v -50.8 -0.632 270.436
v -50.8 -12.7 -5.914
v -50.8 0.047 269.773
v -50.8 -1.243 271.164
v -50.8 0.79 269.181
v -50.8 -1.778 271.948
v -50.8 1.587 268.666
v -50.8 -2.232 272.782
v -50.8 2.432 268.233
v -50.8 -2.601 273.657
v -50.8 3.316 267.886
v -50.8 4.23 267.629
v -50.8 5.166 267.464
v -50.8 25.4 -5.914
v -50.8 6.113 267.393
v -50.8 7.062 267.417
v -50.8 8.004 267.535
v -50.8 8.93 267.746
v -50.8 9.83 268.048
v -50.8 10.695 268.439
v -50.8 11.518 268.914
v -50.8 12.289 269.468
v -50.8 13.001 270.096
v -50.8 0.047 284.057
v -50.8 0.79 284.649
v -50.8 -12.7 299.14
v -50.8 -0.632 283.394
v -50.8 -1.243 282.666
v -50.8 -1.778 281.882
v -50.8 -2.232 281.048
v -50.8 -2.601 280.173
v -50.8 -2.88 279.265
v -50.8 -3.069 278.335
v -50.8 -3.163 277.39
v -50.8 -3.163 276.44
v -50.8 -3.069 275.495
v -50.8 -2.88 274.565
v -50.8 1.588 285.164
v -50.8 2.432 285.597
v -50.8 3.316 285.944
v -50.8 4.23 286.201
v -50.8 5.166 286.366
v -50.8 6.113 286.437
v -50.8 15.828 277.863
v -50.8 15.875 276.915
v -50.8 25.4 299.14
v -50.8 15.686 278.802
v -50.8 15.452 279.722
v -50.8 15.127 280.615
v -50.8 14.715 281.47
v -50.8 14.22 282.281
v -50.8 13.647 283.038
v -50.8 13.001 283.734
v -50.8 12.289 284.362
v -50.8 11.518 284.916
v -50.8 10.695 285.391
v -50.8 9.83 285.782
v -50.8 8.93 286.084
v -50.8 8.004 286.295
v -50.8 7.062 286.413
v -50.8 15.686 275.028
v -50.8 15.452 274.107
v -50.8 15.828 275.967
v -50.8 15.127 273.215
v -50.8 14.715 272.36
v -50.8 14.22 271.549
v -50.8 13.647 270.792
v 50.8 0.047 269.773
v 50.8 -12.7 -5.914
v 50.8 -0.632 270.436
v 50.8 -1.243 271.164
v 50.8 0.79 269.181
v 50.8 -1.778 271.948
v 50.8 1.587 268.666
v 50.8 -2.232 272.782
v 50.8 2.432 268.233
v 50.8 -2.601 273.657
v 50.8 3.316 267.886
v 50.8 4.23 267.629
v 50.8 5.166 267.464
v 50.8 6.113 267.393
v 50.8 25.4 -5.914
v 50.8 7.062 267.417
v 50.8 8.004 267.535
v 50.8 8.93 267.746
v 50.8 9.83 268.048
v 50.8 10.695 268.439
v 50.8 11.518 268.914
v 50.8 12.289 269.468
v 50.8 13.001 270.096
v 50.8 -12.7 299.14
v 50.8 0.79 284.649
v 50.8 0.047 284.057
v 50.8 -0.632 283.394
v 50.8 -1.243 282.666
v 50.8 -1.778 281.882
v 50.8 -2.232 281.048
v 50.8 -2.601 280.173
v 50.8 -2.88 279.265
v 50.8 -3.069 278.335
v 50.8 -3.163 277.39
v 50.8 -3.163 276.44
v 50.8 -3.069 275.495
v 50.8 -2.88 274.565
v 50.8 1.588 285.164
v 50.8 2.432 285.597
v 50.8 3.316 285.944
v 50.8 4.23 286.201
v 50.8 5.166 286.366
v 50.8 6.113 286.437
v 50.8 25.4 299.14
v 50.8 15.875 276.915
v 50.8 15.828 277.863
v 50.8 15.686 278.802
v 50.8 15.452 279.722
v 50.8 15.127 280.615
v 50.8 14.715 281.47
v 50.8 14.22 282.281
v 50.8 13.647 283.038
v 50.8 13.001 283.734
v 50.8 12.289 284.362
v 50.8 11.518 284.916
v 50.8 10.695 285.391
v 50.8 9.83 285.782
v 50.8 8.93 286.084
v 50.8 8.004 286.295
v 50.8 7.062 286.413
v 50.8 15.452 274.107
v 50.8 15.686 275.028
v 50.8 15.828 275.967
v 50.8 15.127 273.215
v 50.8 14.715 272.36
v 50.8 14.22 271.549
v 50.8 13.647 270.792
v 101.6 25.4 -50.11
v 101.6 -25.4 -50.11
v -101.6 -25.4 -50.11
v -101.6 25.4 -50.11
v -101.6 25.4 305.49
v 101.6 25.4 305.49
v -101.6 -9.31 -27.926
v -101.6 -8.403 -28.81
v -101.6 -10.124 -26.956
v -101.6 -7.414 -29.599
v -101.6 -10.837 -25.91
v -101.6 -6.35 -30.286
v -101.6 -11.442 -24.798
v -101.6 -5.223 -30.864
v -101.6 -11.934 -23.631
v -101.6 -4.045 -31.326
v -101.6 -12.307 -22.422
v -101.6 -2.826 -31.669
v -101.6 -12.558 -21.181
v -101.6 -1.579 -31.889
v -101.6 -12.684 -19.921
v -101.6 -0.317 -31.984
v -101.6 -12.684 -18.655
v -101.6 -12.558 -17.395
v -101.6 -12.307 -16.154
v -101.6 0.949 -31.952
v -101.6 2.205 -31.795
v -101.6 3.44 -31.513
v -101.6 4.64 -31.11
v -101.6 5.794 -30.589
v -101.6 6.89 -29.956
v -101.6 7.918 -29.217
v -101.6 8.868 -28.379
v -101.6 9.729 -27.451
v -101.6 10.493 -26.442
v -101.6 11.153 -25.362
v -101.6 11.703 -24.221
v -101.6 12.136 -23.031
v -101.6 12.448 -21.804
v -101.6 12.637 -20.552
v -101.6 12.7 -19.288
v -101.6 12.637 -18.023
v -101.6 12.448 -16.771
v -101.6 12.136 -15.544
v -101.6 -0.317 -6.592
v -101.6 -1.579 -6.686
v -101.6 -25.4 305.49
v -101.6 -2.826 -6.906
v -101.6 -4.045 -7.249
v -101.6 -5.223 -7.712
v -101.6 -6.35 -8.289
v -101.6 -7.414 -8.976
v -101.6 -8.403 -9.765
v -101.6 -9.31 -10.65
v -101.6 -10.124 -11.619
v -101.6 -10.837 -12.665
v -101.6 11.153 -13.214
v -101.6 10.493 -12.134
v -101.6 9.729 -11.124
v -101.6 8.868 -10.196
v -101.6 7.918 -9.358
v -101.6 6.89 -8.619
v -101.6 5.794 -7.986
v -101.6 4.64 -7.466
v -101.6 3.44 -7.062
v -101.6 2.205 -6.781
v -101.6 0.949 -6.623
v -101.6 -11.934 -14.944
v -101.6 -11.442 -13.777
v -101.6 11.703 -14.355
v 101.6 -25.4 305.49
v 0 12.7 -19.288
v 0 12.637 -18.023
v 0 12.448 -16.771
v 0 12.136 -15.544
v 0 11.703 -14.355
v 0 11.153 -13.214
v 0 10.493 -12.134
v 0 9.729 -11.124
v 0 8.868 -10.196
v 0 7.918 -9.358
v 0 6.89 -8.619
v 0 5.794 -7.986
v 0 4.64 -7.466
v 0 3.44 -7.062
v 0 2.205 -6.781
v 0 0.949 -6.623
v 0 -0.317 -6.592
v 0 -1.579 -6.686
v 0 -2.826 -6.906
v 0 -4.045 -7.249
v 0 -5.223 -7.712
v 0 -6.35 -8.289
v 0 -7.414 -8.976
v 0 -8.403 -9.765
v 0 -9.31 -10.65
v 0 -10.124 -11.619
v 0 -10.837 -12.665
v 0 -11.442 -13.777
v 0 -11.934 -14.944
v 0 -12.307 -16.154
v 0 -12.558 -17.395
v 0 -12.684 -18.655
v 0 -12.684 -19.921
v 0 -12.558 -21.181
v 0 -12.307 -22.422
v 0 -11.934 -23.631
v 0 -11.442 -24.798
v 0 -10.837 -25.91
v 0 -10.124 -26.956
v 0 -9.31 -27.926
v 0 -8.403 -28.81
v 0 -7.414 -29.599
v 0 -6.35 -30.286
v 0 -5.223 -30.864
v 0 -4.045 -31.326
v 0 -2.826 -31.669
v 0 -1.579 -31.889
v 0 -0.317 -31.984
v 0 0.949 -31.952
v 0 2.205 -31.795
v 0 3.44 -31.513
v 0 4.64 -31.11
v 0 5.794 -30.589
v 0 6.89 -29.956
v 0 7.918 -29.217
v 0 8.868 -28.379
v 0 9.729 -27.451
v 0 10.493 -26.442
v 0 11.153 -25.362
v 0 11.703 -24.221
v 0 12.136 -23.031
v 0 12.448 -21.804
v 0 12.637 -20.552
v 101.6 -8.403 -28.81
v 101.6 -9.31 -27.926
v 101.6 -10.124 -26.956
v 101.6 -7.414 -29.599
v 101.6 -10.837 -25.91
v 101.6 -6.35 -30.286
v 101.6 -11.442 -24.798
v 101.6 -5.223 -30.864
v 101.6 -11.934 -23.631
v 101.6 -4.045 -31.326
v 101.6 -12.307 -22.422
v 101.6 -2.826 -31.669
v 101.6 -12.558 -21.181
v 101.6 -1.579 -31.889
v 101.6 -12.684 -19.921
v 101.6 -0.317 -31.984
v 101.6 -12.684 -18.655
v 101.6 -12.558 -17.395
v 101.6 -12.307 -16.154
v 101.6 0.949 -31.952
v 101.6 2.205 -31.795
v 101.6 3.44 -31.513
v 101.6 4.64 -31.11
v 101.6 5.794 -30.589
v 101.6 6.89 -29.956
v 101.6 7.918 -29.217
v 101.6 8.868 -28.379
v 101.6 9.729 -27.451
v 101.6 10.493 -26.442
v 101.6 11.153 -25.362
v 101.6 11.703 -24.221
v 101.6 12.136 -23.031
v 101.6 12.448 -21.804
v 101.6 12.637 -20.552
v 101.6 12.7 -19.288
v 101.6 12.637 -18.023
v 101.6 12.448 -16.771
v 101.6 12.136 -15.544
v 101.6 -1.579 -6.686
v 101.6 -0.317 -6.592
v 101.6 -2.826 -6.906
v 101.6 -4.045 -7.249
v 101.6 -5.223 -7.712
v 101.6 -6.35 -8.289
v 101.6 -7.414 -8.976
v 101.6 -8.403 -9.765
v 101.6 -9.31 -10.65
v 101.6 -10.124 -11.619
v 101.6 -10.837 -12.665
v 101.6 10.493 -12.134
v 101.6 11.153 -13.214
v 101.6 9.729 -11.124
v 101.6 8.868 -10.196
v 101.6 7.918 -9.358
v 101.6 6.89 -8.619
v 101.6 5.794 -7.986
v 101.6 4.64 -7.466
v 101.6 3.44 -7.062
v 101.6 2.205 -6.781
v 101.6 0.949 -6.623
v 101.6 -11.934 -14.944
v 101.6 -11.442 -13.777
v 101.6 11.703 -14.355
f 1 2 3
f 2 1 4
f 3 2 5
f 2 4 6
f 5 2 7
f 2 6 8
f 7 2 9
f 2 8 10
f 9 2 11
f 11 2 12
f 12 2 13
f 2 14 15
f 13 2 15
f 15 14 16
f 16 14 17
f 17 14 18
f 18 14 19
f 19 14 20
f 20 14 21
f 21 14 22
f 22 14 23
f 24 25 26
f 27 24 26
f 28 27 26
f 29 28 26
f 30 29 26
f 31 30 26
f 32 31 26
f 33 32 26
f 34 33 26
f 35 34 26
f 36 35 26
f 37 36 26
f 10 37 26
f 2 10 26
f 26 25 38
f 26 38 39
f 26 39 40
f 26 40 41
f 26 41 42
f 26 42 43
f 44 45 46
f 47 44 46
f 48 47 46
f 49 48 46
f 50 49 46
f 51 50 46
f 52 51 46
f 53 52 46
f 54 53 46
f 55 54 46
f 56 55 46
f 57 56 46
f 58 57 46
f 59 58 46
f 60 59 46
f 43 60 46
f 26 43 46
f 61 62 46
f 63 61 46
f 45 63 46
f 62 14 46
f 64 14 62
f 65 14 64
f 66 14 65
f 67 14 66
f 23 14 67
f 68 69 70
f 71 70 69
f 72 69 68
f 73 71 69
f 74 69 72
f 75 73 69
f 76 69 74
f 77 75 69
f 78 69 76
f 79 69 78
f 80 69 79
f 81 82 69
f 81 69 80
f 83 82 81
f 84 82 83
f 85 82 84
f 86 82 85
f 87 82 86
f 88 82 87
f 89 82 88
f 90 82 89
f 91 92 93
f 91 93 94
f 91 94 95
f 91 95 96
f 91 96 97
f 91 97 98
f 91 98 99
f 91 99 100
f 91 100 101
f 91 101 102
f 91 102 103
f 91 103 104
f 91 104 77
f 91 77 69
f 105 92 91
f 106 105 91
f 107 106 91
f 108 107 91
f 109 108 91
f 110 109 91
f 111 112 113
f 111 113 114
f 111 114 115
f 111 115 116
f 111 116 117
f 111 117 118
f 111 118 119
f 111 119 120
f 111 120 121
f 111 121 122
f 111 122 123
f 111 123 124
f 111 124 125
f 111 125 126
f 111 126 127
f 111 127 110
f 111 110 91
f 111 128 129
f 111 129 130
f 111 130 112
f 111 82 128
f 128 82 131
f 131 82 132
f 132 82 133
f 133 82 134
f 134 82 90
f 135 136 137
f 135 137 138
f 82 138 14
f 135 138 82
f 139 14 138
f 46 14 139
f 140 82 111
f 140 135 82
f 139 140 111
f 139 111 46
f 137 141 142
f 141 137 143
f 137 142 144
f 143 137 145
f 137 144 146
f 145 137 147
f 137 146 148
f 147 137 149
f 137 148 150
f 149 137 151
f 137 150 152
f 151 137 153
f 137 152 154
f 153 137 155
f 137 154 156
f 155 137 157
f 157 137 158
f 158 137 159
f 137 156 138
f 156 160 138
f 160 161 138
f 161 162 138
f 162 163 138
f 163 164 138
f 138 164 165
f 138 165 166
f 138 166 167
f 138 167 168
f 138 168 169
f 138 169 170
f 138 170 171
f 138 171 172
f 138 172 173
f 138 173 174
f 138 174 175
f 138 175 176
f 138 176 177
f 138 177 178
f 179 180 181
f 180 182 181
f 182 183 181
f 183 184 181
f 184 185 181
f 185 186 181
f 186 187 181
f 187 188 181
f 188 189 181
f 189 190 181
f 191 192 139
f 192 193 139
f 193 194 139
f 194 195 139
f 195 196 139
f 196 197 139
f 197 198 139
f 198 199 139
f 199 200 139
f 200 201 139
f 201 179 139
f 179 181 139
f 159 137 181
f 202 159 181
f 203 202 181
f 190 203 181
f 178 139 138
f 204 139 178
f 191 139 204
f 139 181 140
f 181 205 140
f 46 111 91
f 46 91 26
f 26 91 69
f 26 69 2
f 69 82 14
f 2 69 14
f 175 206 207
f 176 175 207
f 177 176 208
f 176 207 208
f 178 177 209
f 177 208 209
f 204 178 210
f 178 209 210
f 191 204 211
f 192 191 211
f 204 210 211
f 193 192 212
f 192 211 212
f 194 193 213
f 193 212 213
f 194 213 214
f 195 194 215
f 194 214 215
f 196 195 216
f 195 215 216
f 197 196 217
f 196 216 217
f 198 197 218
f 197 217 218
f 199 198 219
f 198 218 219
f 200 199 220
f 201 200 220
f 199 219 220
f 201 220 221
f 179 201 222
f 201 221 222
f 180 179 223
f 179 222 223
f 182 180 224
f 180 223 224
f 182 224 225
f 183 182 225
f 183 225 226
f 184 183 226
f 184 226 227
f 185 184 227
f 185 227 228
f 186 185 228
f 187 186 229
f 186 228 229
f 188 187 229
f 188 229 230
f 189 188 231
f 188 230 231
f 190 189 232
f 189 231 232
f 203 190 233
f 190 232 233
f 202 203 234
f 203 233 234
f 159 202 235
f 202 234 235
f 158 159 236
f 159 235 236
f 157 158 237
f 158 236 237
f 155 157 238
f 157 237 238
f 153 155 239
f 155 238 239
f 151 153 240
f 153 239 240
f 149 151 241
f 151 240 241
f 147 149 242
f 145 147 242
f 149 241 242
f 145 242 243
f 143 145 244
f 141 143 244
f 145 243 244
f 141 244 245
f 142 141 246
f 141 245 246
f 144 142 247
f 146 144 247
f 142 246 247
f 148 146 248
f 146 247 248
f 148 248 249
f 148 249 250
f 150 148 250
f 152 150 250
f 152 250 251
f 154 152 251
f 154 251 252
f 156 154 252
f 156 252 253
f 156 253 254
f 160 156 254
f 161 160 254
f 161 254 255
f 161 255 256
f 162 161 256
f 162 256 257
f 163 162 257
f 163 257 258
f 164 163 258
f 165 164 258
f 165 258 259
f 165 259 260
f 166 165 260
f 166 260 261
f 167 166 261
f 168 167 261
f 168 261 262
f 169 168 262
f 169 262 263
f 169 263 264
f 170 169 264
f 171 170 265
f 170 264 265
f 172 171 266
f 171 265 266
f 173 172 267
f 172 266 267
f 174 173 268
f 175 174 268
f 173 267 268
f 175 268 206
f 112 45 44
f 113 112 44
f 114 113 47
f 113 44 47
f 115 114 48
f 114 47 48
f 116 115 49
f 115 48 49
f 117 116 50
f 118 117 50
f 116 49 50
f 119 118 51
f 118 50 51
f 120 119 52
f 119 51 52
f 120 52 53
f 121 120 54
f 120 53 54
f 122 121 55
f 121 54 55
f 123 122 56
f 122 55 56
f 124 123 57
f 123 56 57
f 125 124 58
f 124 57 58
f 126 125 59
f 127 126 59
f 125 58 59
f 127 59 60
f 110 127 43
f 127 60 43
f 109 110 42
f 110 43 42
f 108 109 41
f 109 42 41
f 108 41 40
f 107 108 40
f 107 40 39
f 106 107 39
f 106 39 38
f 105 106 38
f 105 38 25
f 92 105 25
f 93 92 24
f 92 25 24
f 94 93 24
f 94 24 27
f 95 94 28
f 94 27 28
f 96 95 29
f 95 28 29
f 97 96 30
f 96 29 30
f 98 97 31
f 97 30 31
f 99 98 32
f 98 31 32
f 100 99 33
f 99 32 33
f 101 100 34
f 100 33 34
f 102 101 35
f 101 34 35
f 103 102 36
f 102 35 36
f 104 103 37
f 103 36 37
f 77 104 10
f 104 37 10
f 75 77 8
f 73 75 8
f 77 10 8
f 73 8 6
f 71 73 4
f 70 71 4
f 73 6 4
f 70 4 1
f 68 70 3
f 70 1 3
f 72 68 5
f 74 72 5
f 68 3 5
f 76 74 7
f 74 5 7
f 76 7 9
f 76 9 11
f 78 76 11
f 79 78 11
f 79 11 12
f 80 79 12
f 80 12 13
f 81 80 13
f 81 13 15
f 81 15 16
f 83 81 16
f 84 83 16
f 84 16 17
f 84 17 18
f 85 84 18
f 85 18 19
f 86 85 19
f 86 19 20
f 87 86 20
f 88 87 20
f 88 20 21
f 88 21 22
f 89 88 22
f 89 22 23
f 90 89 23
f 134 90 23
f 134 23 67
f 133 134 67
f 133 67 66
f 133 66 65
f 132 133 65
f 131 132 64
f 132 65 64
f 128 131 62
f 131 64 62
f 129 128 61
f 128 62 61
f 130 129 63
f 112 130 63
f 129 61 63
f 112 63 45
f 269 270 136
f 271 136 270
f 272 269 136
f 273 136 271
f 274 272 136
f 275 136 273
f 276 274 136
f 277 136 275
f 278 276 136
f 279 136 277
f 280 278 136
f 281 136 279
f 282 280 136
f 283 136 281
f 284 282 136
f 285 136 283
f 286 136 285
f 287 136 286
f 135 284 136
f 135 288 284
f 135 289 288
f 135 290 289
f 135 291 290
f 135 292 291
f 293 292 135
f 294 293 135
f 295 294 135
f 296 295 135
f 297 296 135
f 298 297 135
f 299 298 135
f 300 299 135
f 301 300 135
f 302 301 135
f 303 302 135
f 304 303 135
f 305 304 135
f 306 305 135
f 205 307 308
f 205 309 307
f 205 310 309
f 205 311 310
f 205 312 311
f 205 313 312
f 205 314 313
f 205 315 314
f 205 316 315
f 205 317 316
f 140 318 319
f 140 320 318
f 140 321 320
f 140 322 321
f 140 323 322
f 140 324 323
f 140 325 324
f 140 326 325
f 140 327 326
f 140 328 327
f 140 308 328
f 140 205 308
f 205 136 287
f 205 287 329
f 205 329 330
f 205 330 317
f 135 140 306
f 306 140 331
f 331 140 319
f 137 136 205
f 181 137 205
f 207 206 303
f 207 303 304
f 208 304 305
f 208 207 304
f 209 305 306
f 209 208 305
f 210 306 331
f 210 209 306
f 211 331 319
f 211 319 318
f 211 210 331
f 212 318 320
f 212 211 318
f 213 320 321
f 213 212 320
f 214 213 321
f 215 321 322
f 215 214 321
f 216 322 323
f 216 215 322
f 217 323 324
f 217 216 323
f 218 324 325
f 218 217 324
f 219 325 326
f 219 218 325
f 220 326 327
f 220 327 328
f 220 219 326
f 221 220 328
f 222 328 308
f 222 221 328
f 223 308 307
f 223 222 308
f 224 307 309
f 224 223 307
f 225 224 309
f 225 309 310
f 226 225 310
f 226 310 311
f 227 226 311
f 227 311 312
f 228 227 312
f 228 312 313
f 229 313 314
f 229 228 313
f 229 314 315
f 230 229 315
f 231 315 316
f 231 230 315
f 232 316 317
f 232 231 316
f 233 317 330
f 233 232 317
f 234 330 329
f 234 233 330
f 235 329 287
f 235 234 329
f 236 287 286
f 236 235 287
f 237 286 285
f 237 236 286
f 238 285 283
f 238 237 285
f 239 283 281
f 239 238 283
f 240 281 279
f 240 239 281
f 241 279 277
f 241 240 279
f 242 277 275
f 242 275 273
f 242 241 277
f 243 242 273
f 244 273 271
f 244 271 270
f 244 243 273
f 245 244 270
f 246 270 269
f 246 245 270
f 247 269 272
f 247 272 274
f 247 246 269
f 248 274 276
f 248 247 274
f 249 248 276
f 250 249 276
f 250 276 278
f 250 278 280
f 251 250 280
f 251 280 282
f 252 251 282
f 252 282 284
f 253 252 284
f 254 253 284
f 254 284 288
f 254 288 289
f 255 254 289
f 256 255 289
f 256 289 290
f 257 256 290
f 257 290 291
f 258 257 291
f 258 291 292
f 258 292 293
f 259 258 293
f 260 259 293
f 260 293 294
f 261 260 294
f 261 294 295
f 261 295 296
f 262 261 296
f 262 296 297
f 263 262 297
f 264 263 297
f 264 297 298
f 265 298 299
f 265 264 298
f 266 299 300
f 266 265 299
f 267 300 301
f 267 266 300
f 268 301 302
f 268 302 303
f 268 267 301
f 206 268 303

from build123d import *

# Parameters (mm, degrees)
F0_W          = 50.8
F0_H          = 355.6
F0_R          = 12.7
F1_DEPTH      = 101.6
F1_DEPTH_BACK = 101.6
F2_W          = 101.6
F2_H          = 305.054
F3_DEPTH      = 38.1
F4_R          = 9.525
F5_DEPTH      = 101.6


with BuildPart() as f1:
    # F0 (on Right) → F1 (new body, two sides)
    with BuildSketch(Plane.YZ) as f1_sk:
        with Locations((0, 127.68995)):
            Rectangle(F0_W, F0_H)
        with Locations((0, -19.287717)):
            Circle(F0_R, mode=Mode.SUBTRACT)
    extrude(amount=F1_DEPTH)
    extrude(f1_sk.sketch, amount=-F1_DEPTH_BACK)

    # F2 (on face) → F3 (cut)
    with BuildSketch(Plane(origin=(0, 25.4, 0), x_dir=(-1, 0, 0), z_dir=(0, 1, 0))):
        with Locations((0, 146.61295)):
            Rectangle(F2_W, F2_H)
    extrude(amount=-F3_DEPTH, mode=Mode.SUBTRACT)

    # F4 (on face) → F5 (join, through all)
    with BuildSketch(Plane.YZ.offset(-50.8)):
        with Locations((6.35, 276.91495)):
            Circle(F4_R)
    extrude(amount=F5_DEPTH)


solid = f1.part
